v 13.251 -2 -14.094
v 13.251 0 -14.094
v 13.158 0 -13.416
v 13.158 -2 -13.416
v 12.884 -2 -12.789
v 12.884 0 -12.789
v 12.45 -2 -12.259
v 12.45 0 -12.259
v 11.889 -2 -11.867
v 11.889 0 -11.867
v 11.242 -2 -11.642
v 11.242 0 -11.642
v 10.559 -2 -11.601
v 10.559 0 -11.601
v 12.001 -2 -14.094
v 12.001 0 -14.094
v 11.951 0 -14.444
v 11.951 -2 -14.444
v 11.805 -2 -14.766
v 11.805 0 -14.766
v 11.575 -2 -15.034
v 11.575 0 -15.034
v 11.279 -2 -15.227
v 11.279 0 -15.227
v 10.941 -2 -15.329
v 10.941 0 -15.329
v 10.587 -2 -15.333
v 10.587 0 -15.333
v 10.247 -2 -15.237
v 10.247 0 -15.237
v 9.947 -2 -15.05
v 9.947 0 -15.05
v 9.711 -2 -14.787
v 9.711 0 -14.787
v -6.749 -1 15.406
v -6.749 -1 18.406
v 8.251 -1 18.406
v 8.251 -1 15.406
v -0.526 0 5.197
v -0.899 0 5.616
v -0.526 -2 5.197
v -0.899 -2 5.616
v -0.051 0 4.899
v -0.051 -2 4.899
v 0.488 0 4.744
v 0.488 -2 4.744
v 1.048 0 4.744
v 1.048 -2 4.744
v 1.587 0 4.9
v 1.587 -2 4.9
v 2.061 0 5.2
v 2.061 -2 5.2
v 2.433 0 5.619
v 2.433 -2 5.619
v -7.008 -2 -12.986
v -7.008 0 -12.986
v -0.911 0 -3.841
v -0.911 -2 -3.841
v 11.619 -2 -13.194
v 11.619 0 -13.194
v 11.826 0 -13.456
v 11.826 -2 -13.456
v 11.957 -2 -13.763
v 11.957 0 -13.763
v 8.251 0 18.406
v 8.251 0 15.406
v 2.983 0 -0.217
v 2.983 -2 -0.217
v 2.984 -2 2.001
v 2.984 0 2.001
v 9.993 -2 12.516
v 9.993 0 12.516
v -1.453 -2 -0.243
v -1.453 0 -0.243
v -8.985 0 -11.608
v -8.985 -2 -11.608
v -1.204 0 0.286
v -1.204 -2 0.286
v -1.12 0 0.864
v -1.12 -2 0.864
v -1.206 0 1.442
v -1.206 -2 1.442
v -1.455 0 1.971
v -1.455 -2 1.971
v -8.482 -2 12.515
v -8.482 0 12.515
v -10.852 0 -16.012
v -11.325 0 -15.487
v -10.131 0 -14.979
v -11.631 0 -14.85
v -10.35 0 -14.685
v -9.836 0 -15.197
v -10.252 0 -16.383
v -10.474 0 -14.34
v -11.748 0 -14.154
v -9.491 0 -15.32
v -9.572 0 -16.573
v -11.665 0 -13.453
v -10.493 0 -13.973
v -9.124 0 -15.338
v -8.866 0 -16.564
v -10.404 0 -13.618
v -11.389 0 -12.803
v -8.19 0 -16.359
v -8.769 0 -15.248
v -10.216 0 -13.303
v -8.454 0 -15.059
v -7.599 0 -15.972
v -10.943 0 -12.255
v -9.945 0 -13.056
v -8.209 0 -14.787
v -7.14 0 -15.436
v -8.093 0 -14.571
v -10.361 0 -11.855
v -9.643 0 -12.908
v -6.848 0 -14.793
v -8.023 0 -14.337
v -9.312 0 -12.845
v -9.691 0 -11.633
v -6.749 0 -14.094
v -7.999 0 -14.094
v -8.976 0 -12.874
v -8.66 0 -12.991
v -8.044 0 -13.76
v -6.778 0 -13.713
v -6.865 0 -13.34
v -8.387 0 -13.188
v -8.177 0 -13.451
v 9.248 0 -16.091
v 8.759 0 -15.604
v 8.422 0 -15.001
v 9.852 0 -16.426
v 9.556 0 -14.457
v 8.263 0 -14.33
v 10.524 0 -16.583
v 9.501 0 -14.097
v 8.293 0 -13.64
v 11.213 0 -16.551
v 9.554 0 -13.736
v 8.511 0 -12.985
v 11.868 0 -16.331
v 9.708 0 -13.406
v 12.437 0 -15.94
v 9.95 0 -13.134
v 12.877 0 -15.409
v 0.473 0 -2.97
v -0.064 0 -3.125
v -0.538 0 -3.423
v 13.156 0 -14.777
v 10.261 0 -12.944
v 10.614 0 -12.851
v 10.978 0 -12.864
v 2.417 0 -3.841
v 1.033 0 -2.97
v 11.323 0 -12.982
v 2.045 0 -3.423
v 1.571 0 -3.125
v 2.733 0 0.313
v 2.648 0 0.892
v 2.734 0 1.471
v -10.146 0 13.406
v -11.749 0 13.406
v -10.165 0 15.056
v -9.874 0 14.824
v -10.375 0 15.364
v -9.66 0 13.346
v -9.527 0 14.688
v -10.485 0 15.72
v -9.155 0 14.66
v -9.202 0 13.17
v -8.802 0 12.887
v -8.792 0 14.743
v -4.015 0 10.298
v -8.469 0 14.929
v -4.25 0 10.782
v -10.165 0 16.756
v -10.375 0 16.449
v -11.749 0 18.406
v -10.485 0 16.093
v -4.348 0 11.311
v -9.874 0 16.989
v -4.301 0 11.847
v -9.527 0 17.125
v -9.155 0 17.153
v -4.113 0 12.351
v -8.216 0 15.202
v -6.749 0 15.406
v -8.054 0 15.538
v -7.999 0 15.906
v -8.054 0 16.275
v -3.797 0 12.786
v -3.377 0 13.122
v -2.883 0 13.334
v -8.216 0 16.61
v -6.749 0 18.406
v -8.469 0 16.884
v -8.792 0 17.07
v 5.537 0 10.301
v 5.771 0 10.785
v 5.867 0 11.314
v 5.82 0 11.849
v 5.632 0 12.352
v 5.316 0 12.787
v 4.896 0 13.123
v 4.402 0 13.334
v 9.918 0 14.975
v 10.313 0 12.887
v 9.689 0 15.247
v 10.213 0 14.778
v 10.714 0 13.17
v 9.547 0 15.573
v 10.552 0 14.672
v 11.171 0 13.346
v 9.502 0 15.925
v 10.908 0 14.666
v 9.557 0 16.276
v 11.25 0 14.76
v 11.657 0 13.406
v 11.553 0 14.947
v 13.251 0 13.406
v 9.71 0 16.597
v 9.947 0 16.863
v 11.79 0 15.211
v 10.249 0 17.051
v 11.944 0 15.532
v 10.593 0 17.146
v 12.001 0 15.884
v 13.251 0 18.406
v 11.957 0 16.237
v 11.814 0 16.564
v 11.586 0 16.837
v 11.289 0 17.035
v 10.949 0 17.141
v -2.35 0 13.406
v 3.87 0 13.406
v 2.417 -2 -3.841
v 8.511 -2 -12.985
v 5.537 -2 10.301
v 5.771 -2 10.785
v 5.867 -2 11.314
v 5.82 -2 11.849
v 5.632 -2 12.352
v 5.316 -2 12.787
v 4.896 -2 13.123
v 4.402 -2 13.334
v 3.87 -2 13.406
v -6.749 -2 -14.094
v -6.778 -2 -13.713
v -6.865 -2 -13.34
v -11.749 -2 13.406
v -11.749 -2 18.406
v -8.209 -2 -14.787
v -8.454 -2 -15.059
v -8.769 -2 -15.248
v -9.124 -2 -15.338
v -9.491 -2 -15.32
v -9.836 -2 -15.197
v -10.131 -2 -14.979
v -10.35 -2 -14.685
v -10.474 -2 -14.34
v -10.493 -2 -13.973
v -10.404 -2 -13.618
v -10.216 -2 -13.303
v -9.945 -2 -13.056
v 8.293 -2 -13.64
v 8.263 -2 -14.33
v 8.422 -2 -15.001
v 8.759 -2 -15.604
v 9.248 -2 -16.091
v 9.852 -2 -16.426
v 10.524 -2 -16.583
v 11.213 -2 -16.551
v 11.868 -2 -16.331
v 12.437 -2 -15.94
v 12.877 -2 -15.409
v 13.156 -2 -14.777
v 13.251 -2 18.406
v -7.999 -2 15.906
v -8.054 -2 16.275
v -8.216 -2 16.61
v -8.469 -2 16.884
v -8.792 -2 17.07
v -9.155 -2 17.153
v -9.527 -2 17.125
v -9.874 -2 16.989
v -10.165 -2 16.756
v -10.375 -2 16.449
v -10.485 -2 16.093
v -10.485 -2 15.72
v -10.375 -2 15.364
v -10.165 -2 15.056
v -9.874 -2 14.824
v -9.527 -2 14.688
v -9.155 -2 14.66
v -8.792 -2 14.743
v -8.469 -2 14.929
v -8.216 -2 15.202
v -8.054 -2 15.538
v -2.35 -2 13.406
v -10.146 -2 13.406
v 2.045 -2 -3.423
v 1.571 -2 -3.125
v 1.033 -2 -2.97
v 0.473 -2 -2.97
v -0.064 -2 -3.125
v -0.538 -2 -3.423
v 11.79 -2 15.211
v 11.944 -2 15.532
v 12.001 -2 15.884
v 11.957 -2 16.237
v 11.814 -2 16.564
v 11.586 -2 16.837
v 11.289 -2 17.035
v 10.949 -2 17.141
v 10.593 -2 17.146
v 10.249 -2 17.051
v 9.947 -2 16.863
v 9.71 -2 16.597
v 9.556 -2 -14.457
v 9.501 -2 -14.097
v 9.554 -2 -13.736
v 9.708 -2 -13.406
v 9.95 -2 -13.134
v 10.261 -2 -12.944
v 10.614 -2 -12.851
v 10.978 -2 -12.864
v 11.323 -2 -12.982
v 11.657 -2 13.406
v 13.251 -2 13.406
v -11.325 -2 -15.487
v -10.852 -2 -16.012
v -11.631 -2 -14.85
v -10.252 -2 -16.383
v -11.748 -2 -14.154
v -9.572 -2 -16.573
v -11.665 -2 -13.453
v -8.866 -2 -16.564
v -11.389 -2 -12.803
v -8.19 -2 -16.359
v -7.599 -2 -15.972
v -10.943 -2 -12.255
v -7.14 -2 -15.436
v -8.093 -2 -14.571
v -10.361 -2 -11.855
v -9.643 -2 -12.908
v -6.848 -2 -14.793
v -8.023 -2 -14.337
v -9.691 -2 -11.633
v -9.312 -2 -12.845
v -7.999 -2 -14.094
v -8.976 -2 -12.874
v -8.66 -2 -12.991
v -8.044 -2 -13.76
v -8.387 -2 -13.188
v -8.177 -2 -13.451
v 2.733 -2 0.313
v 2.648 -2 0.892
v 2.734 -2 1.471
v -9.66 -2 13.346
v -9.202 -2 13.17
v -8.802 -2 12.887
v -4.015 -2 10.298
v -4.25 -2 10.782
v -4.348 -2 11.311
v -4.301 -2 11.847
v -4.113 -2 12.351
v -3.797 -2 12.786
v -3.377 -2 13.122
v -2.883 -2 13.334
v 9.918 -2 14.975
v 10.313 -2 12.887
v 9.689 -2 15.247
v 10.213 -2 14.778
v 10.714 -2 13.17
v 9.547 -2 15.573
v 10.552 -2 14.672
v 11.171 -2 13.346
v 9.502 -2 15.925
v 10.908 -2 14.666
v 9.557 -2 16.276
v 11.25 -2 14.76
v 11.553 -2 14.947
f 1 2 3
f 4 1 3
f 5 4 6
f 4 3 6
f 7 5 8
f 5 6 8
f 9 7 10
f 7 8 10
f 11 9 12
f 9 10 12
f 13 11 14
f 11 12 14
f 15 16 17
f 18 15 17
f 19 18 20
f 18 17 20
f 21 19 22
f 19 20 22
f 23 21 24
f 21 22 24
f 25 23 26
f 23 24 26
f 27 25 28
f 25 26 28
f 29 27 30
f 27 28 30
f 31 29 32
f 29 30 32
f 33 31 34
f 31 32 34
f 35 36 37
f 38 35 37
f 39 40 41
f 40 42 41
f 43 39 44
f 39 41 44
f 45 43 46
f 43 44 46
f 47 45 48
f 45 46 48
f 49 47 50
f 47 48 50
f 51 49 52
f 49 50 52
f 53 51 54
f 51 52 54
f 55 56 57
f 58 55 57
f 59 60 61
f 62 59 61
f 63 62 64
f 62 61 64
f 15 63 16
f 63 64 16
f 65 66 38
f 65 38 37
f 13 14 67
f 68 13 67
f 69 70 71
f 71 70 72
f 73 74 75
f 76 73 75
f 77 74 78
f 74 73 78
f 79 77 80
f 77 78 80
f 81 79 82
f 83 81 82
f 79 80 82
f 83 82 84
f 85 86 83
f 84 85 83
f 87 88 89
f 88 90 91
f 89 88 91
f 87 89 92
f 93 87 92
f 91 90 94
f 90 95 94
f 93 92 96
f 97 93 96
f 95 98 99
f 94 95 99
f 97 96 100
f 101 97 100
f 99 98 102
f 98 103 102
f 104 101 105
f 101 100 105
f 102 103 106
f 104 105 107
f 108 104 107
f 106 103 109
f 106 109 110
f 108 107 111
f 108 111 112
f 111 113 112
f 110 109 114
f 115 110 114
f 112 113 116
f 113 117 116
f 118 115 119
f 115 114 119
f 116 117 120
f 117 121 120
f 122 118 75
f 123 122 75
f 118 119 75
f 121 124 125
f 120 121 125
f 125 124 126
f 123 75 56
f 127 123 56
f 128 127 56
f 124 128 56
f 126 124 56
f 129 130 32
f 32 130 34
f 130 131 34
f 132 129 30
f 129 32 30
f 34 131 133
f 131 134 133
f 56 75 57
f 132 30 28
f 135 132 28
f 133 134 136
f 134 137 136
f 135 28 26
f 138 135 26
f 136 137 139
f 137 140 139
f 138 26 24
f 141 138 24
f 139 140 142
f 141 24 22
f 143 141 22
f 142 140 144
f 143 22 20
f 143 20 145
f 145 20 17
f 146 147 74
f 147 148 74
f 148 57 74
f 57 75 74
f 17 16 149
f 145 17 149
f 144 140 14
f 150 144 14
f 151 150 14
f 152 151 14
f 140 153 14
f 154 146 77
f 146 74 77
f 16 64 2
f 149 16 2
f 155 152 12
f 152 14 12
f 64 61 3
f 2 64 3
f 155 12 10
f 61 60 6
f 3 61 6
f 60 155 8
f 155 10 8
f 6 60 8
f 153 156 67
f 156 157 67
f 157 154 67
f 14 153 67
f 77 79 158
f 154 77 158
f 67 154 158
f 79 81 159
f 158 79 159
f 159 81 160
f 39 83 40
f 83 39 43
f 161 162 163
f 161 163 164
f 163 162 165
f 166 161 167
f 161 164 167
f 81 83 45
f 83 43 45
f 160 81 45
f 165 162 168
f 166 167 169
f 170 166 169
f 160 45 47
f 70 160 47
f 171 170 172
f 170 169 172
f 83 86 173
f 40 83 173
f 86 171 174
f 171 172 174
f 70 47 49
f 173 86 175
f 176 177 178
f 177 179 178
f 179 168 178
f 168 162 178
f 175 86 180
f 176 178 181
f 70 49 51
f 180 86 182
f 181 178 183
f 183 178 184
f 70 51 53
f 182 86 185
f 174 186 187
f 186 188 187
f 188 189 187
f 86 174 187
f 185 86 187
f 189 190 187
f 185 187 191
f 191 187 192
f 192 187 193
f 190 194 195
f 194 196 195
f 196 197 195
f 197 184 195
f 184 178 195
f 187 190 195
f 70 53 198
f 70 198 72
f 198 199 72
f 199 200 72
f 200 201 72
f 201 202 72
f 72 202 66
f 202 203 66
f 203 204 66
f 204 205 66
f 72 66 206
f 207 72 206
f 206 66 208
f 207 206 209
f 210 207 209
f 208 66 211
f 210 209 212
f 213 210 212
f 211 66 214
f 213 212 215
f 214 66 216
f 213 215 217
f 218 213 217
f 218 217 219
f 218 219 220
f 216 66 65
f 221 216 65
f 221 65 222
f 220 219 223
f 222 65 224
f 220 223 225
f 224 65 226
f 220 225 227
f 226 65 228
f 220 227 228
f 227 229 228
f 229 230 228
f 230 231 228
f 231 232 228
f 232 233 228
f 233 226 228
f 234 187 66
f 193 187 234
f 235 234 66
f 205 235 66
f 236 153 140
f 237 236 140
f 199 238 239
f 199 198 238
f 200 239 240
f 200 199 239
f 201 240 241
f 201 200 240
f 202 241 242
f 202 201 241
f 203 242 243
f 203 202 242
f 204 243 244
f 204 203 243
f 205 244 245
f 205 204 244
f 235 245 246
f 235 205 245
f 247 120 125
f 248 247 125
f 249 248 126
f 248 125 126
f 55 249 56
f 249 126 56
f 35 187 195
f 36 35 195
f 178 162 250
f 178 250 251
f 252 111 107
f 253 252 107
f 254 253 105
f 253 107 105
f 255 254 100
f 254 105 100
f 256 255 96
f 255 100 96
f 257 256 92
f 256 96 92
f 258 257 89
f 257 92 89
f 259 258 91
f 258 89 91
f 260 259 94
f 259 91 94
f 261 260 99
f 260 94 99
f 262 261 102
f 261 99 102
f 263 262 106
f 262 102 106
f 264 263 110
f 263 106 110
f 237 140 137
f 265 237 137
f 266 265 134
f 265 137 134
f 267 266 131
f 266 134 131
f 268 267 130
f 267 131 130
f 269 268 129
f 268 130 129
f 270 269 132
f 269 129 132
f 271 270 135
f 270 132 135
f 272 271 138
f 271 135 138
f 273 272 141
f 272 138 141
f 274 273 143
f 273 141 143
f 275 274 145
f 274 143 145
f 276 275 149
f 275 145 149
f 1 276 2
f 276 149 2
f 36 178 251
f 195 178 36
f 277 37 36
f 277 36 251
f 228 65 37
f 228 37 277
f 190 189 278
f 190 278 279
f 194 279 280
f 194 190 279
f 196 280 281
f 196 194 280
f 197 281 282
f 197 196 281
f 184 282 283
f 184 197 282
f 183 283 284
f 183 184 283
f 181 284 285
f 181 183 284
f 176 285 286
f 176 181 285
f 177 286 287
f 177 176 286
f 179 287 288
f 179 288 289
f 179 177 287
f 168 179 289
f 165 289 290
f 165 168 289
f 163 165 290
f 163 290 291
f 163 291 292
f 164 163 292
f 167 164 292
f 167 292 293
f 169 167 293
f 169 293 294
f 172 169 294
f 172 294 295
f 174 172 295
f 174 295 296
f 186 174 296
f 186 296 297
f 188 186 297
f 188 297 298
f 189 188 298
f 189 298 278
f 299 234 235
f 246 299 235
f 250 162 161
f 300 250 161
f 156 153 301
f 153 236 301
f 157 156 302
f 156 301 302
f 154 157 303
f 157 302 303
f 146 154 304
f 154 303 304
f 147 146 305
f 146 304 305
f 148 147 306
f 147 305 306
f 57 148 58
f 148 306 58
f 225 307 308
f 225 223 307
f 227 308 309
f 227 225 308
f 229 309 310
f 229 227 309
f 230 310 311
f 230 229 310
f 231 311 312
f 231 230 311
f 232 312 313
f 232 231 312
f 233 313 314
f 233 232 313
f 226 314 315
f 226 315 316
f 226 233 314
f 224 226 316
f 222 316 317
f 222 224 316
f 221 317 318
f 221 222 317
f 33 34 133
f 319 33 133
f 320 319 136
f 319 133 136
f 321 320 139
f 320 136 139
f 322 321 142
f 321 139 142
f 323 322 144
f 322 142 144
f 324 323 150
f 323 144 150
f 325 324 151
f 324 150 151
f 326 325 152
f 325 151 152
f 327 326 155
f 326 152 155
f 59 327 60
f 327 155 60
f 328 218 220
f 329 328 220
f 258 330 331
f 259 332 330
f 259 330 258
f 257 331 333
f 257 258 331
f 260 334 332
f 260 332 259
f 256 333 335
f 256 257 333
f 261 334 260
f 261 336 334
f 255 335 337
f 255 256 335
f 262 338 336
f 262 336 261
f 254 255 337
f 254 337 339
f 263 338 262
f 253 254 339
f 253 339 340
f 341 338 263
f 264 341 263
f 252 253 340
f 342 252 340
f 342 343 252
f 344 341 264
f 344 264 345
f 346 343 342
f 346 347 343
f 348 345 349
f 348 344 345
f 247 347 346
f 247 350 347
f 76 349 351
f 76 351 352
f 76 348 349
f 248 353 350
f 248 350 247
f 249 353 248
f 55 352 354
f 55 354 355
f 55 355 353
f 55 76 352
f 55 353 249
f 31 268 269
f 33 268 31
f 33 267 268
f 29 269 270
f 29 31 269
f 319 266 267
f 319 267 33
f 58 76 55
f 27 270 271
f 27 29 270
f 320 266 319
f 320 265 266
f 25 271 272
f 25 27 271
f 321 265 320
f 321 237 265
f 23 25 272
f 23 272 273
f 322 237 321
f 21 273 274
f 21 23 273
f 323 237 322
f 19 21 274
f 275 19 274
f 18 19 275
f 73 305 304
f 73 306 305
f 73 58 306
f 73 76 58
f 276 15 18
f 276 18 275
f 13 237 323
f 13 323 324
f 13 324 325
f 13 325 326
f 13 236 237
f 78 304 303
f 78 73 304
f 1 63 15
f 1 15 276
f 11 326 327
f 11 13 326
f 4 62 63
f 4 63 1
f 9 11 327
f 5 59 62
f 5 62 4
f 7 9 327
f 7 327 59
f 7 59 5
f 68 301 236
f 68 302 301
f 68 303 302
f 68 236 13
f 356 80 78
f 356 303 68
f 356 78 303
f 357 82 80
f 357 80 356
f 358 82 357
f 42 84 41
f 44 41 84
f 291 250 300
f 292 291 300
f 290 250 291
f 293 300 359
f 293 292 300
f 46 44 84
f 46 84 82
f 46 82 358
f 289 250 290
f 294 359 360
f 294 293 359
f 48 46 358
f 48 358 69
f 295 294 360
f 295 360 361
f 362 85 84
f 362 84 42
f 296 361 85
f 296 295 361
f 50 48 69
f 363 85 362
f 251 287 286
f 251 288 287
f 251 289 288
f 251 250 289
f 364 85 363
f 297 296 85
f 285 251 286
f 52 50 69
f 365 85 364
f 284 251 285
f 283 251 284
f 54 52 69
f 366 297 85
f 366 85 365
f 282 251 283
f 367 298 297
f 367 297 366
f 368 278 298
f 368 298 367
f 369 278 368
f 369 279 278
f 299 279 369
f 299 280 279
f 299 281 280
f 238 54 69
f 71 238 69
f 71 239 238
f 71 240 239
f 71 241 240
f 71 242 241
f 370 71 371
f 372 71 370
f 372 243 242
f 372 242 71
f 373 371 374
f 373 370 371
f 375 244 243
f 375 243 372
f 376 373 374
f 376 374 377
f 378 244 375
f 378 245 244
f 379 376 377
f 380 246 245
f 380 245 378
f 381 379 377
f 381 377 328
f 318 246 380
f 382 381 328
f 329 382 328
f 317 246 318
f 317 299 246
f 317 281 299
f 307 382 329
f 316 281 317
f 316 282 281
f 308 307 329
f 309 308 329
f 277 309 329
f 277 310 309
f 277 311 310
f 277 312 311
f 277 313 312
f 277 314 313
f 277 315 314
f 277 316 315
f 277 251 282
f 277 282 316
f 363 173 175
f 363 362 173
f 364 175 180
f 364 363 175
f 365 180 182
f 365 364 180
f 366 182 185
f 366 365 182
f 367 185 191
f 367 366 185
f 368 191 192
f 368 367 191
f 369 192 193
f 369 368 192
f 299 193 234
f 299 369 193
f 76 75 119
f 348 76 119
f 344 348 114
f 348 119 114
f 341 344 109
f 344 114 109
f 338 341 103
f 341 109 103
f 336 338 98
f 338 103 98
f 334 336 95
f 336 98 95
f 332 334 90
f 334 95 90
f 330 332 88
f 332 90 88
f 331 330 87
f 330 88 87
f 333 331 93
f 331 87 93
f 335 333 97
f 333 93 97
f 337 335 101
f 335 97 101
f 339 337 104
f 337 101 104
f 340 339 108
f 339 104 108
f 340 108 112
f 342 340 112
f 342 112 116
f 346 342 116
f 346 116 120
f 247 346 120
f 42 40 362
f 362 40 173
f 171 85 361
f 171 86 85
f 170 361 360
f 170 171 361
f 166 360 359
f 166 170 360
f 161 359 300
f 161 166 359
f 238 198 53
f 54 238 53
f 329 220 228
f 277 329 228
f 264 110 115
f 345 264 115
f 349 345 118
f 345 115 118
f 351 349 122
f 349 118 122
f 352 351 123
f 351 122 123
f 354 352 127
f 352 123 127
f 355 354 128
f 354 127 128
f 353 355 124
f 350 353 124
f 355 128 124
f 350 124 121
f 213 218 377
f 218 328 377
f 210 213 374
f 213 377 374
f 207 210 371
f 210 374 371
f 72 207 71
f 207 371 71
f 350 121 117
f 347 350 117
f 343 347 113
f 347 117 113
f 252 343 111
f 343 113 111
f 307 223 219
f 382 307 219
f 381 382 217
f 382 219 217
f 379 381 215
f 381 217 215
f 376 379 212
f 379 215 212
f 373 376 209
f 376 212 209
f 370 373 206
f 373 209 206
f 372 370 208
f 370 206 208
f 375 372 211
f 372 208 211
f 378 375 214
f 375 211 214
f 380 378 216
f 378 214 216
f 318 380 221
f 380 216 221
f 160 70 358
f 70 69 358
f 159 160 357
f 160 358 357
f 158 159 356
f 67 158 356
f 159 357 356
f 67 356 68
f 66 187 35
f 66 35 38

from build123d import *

# Parameters (mm, degrees)
F1_W     = 25
F1_H     = 5
F1_R     = 1.25
F2_DEPTH = 2
F0_W     = 15
F0_H     = 3
F3_DEPTH = 1
F5_DEPTH = 2
F6_R     = 2


with BuildPart() as f2:
    # F1 (on Front) → F2 (new body)
    with BuildSketch(Plane.XZ):
        with Locations((0.7514315657, 15.9062612424)):
            Rectangle(F1_W, F1_H)
        with Locations((-9.2485684343, 15.9062612424)):
            Circle(F1_R, mode=Mode.SUBTRACT)
        with Locations((10.7514315657, 15.9062612424)):
            Circle(F1_R, mode=Mode.SUBTRACT)
    extrude(amount=F2_DEPTH)

    # F0 (on Front) → F3 (cut)
    with BuildSketch(Plane.XZ):
        with Locations((0.7514315657, 16.9062612424)):
            Rectangle(F0_W, F0_H)
    extrude(amount=F3_DEPTH, mode=Mode.SUBTRACT)

    # F4 (on Front) → F5 (join)
    with BuildSketch(Plane.XZ):
        with BuildLine():
            ThreePointArc((11.7901169805, 15.2108242509), (10.058409027, 14.8659633231), (9.7095267544, 16.5968655894))
            Line((9.7095267544, 16.5968655894), (0.7694446684, 3.1090927712))
            Line((0.7694446684, 3.1090927712), (2.2445774484, 0.8925128366))
            Line((2.2445774484, 0.8925128366), (11.7901169805, 15.2108242509))
        make_face()
        Polygon((2.2445774484, 0.8925128366), (0.7694446684, 3.1090927712), (-0.7182862862, 0.8645745513), (0.7534939653, -1.3441127186), align=None)
        with BuildLine():
            Line((-0.7182862862, 0.8645745513), (0.7694446684, 3.1090927712))
            Line((0.7694446684, 3.1090927712), (-8.207945318, 16.5987953787))
            ThreePointArc((-8.207945318, 16.5987953787), (-8.4991860984, 14.9057982922), (-10.2057692667, 15.1023541792))
            Line((-10.2057692667, 15.1023541792), (-0.7182862862, 0.8645745513))
        make_face()
        with BuildLine():
            Line((10.5591020697, -11.6011478636), (2.2445774484, 0.8925128366))
            Line((2.2445774484, 0.8925128366), (0.7534939653, -1.3441127186))
            Line((0.7534939653, -1.3441127186), (8.5106430868, -12.9851960237))
            ThreePointArc((8.5106430868, -12.9851960237), (9.3518197991, -12.0222448757), (10.5591020697, -11.6011478636))
        make_face()
        with BuildLine():
            Line((0.7534939653, -1.3441127186), (-0.7182862862, 0.8645745513))
            Line((-0.7182862862, 0.8645745513), (-8.9852317039, -11.6076466904))
            ThreePointArc((-8.9852317039, -11.6076466904), (-7.8193399291, -12.0425669267), (-7.0075444884, -12.9856721197))
            Line((-7.0075444884, -12.9856721197), (0.7534939653, -1.3441127186))
        make_face()
        with BuildLine():
            Line((11.6190981521, -13.1939306142), (10.5591020697, -11.6011478636))
            ThreePointArc((10.5591020697, -11.6011478636), (9.3518197991, -12.0222448757), (8.5106430868, -12.9851960237))
            Line((8.5106430868, -12.9851960237), (9.7112213616, -14.7868929477))
            ThreePointArc((9.7112213616, -14.7868929477), (9.9502917065, -13.1342206879), (11.6190981521, -13.1939306142))
        make_face()
        with BuildLine():
            ThreePointArc((13.2514315657, -14.0937387576), (12.4498390934, -12.259232865), (10.5591020697, -11.6011478636))
            Line((10.5591020697, -11.6011478636), (11.6190981521, -13.1939306142))
            ThreePointArc((11.6190981521, -13.1939306142), (11.9018843533, -13.6049050604), (12.0014315657, -14.0937387576))
            ThreePointArc((12.0014315657, -14.0937387576), (11.1135346207, -15.2901422754), (9.7112213616, -14.7868929477))
            Line((9.7112213616, -14.7868929477), (8.5106430868, -12.9851960237))
            ThreePointArc((8.5106430868, -12.9851960237), (10.1822089367, -16.5280734919), (13.2514315657, -14.0937387576))
        make_face()
        with BuildLine():
            Line((-9.9451010739, -13.0557877559), (-8.9852317039, -11.6076466904))
            ThreePointArc((-8.9852317039, -11.6076466904), (-11.1071084292, -15.7658120476), (-6.7485684343, -14.0937387576))
            ThreePointArc((-6.7485684343, -14.0937387576), (-6.8141732461, -13.5247747274), (-7.0075444884, -12.9856721197))
            Line((-7.0075444884, -12.9856721197), (-8.208505519, -14.7871139319))
            ThreePointArc((-8.208505519, -14.7871139319), (-10.1311078637, -14.9789642404), (-9.9451010739, -13.0557877559))
        make_face()
        with BuildLine():
            ThreePointArc((-7.0075444884, -12.9856721197), (-7.8193399291, -12.0425669267), (-8.9852317039, -11.6076466904))
            Line((-8.9852317039, -11.6076466904), (-9.9451010739, -13.0557877559))
            ThreePointArc((-9.9451010739, -13.0557877559), (-8.6604212586, -12.9907505891), (-7.9985684343, -14.0937387576))
            ThreePointArc((-7.9985684343, -14.0937387576), (-8.0522033888, -14.4559689026), (-8.208505519, -14.7871139319))
            Line((-8.208505519, -14.7871139319), (-7.0075444884, -12.9856721197))
        make_face()
    extrude(amount=F5_DEPTH)

    # F6
    f6_edges = [f2.edges().sort_by_distance(p)[0] for p in [
        (0.769445, -1, 3.109093),
        (-0.718286, -1, 0.864575),
        (2.244577, -1, 0.892513),
        (0.753494, -1, -1.344113),
        (7.594703, -1, 13.406261),
        (-6.083316, -1, 13.406261),
        (-9.075561, -1, 13.406261),
        (10.587075, -1, 13.406261),
    ]]
    fillet(f6_edges, radius=F6_R)


solid = f2.part
